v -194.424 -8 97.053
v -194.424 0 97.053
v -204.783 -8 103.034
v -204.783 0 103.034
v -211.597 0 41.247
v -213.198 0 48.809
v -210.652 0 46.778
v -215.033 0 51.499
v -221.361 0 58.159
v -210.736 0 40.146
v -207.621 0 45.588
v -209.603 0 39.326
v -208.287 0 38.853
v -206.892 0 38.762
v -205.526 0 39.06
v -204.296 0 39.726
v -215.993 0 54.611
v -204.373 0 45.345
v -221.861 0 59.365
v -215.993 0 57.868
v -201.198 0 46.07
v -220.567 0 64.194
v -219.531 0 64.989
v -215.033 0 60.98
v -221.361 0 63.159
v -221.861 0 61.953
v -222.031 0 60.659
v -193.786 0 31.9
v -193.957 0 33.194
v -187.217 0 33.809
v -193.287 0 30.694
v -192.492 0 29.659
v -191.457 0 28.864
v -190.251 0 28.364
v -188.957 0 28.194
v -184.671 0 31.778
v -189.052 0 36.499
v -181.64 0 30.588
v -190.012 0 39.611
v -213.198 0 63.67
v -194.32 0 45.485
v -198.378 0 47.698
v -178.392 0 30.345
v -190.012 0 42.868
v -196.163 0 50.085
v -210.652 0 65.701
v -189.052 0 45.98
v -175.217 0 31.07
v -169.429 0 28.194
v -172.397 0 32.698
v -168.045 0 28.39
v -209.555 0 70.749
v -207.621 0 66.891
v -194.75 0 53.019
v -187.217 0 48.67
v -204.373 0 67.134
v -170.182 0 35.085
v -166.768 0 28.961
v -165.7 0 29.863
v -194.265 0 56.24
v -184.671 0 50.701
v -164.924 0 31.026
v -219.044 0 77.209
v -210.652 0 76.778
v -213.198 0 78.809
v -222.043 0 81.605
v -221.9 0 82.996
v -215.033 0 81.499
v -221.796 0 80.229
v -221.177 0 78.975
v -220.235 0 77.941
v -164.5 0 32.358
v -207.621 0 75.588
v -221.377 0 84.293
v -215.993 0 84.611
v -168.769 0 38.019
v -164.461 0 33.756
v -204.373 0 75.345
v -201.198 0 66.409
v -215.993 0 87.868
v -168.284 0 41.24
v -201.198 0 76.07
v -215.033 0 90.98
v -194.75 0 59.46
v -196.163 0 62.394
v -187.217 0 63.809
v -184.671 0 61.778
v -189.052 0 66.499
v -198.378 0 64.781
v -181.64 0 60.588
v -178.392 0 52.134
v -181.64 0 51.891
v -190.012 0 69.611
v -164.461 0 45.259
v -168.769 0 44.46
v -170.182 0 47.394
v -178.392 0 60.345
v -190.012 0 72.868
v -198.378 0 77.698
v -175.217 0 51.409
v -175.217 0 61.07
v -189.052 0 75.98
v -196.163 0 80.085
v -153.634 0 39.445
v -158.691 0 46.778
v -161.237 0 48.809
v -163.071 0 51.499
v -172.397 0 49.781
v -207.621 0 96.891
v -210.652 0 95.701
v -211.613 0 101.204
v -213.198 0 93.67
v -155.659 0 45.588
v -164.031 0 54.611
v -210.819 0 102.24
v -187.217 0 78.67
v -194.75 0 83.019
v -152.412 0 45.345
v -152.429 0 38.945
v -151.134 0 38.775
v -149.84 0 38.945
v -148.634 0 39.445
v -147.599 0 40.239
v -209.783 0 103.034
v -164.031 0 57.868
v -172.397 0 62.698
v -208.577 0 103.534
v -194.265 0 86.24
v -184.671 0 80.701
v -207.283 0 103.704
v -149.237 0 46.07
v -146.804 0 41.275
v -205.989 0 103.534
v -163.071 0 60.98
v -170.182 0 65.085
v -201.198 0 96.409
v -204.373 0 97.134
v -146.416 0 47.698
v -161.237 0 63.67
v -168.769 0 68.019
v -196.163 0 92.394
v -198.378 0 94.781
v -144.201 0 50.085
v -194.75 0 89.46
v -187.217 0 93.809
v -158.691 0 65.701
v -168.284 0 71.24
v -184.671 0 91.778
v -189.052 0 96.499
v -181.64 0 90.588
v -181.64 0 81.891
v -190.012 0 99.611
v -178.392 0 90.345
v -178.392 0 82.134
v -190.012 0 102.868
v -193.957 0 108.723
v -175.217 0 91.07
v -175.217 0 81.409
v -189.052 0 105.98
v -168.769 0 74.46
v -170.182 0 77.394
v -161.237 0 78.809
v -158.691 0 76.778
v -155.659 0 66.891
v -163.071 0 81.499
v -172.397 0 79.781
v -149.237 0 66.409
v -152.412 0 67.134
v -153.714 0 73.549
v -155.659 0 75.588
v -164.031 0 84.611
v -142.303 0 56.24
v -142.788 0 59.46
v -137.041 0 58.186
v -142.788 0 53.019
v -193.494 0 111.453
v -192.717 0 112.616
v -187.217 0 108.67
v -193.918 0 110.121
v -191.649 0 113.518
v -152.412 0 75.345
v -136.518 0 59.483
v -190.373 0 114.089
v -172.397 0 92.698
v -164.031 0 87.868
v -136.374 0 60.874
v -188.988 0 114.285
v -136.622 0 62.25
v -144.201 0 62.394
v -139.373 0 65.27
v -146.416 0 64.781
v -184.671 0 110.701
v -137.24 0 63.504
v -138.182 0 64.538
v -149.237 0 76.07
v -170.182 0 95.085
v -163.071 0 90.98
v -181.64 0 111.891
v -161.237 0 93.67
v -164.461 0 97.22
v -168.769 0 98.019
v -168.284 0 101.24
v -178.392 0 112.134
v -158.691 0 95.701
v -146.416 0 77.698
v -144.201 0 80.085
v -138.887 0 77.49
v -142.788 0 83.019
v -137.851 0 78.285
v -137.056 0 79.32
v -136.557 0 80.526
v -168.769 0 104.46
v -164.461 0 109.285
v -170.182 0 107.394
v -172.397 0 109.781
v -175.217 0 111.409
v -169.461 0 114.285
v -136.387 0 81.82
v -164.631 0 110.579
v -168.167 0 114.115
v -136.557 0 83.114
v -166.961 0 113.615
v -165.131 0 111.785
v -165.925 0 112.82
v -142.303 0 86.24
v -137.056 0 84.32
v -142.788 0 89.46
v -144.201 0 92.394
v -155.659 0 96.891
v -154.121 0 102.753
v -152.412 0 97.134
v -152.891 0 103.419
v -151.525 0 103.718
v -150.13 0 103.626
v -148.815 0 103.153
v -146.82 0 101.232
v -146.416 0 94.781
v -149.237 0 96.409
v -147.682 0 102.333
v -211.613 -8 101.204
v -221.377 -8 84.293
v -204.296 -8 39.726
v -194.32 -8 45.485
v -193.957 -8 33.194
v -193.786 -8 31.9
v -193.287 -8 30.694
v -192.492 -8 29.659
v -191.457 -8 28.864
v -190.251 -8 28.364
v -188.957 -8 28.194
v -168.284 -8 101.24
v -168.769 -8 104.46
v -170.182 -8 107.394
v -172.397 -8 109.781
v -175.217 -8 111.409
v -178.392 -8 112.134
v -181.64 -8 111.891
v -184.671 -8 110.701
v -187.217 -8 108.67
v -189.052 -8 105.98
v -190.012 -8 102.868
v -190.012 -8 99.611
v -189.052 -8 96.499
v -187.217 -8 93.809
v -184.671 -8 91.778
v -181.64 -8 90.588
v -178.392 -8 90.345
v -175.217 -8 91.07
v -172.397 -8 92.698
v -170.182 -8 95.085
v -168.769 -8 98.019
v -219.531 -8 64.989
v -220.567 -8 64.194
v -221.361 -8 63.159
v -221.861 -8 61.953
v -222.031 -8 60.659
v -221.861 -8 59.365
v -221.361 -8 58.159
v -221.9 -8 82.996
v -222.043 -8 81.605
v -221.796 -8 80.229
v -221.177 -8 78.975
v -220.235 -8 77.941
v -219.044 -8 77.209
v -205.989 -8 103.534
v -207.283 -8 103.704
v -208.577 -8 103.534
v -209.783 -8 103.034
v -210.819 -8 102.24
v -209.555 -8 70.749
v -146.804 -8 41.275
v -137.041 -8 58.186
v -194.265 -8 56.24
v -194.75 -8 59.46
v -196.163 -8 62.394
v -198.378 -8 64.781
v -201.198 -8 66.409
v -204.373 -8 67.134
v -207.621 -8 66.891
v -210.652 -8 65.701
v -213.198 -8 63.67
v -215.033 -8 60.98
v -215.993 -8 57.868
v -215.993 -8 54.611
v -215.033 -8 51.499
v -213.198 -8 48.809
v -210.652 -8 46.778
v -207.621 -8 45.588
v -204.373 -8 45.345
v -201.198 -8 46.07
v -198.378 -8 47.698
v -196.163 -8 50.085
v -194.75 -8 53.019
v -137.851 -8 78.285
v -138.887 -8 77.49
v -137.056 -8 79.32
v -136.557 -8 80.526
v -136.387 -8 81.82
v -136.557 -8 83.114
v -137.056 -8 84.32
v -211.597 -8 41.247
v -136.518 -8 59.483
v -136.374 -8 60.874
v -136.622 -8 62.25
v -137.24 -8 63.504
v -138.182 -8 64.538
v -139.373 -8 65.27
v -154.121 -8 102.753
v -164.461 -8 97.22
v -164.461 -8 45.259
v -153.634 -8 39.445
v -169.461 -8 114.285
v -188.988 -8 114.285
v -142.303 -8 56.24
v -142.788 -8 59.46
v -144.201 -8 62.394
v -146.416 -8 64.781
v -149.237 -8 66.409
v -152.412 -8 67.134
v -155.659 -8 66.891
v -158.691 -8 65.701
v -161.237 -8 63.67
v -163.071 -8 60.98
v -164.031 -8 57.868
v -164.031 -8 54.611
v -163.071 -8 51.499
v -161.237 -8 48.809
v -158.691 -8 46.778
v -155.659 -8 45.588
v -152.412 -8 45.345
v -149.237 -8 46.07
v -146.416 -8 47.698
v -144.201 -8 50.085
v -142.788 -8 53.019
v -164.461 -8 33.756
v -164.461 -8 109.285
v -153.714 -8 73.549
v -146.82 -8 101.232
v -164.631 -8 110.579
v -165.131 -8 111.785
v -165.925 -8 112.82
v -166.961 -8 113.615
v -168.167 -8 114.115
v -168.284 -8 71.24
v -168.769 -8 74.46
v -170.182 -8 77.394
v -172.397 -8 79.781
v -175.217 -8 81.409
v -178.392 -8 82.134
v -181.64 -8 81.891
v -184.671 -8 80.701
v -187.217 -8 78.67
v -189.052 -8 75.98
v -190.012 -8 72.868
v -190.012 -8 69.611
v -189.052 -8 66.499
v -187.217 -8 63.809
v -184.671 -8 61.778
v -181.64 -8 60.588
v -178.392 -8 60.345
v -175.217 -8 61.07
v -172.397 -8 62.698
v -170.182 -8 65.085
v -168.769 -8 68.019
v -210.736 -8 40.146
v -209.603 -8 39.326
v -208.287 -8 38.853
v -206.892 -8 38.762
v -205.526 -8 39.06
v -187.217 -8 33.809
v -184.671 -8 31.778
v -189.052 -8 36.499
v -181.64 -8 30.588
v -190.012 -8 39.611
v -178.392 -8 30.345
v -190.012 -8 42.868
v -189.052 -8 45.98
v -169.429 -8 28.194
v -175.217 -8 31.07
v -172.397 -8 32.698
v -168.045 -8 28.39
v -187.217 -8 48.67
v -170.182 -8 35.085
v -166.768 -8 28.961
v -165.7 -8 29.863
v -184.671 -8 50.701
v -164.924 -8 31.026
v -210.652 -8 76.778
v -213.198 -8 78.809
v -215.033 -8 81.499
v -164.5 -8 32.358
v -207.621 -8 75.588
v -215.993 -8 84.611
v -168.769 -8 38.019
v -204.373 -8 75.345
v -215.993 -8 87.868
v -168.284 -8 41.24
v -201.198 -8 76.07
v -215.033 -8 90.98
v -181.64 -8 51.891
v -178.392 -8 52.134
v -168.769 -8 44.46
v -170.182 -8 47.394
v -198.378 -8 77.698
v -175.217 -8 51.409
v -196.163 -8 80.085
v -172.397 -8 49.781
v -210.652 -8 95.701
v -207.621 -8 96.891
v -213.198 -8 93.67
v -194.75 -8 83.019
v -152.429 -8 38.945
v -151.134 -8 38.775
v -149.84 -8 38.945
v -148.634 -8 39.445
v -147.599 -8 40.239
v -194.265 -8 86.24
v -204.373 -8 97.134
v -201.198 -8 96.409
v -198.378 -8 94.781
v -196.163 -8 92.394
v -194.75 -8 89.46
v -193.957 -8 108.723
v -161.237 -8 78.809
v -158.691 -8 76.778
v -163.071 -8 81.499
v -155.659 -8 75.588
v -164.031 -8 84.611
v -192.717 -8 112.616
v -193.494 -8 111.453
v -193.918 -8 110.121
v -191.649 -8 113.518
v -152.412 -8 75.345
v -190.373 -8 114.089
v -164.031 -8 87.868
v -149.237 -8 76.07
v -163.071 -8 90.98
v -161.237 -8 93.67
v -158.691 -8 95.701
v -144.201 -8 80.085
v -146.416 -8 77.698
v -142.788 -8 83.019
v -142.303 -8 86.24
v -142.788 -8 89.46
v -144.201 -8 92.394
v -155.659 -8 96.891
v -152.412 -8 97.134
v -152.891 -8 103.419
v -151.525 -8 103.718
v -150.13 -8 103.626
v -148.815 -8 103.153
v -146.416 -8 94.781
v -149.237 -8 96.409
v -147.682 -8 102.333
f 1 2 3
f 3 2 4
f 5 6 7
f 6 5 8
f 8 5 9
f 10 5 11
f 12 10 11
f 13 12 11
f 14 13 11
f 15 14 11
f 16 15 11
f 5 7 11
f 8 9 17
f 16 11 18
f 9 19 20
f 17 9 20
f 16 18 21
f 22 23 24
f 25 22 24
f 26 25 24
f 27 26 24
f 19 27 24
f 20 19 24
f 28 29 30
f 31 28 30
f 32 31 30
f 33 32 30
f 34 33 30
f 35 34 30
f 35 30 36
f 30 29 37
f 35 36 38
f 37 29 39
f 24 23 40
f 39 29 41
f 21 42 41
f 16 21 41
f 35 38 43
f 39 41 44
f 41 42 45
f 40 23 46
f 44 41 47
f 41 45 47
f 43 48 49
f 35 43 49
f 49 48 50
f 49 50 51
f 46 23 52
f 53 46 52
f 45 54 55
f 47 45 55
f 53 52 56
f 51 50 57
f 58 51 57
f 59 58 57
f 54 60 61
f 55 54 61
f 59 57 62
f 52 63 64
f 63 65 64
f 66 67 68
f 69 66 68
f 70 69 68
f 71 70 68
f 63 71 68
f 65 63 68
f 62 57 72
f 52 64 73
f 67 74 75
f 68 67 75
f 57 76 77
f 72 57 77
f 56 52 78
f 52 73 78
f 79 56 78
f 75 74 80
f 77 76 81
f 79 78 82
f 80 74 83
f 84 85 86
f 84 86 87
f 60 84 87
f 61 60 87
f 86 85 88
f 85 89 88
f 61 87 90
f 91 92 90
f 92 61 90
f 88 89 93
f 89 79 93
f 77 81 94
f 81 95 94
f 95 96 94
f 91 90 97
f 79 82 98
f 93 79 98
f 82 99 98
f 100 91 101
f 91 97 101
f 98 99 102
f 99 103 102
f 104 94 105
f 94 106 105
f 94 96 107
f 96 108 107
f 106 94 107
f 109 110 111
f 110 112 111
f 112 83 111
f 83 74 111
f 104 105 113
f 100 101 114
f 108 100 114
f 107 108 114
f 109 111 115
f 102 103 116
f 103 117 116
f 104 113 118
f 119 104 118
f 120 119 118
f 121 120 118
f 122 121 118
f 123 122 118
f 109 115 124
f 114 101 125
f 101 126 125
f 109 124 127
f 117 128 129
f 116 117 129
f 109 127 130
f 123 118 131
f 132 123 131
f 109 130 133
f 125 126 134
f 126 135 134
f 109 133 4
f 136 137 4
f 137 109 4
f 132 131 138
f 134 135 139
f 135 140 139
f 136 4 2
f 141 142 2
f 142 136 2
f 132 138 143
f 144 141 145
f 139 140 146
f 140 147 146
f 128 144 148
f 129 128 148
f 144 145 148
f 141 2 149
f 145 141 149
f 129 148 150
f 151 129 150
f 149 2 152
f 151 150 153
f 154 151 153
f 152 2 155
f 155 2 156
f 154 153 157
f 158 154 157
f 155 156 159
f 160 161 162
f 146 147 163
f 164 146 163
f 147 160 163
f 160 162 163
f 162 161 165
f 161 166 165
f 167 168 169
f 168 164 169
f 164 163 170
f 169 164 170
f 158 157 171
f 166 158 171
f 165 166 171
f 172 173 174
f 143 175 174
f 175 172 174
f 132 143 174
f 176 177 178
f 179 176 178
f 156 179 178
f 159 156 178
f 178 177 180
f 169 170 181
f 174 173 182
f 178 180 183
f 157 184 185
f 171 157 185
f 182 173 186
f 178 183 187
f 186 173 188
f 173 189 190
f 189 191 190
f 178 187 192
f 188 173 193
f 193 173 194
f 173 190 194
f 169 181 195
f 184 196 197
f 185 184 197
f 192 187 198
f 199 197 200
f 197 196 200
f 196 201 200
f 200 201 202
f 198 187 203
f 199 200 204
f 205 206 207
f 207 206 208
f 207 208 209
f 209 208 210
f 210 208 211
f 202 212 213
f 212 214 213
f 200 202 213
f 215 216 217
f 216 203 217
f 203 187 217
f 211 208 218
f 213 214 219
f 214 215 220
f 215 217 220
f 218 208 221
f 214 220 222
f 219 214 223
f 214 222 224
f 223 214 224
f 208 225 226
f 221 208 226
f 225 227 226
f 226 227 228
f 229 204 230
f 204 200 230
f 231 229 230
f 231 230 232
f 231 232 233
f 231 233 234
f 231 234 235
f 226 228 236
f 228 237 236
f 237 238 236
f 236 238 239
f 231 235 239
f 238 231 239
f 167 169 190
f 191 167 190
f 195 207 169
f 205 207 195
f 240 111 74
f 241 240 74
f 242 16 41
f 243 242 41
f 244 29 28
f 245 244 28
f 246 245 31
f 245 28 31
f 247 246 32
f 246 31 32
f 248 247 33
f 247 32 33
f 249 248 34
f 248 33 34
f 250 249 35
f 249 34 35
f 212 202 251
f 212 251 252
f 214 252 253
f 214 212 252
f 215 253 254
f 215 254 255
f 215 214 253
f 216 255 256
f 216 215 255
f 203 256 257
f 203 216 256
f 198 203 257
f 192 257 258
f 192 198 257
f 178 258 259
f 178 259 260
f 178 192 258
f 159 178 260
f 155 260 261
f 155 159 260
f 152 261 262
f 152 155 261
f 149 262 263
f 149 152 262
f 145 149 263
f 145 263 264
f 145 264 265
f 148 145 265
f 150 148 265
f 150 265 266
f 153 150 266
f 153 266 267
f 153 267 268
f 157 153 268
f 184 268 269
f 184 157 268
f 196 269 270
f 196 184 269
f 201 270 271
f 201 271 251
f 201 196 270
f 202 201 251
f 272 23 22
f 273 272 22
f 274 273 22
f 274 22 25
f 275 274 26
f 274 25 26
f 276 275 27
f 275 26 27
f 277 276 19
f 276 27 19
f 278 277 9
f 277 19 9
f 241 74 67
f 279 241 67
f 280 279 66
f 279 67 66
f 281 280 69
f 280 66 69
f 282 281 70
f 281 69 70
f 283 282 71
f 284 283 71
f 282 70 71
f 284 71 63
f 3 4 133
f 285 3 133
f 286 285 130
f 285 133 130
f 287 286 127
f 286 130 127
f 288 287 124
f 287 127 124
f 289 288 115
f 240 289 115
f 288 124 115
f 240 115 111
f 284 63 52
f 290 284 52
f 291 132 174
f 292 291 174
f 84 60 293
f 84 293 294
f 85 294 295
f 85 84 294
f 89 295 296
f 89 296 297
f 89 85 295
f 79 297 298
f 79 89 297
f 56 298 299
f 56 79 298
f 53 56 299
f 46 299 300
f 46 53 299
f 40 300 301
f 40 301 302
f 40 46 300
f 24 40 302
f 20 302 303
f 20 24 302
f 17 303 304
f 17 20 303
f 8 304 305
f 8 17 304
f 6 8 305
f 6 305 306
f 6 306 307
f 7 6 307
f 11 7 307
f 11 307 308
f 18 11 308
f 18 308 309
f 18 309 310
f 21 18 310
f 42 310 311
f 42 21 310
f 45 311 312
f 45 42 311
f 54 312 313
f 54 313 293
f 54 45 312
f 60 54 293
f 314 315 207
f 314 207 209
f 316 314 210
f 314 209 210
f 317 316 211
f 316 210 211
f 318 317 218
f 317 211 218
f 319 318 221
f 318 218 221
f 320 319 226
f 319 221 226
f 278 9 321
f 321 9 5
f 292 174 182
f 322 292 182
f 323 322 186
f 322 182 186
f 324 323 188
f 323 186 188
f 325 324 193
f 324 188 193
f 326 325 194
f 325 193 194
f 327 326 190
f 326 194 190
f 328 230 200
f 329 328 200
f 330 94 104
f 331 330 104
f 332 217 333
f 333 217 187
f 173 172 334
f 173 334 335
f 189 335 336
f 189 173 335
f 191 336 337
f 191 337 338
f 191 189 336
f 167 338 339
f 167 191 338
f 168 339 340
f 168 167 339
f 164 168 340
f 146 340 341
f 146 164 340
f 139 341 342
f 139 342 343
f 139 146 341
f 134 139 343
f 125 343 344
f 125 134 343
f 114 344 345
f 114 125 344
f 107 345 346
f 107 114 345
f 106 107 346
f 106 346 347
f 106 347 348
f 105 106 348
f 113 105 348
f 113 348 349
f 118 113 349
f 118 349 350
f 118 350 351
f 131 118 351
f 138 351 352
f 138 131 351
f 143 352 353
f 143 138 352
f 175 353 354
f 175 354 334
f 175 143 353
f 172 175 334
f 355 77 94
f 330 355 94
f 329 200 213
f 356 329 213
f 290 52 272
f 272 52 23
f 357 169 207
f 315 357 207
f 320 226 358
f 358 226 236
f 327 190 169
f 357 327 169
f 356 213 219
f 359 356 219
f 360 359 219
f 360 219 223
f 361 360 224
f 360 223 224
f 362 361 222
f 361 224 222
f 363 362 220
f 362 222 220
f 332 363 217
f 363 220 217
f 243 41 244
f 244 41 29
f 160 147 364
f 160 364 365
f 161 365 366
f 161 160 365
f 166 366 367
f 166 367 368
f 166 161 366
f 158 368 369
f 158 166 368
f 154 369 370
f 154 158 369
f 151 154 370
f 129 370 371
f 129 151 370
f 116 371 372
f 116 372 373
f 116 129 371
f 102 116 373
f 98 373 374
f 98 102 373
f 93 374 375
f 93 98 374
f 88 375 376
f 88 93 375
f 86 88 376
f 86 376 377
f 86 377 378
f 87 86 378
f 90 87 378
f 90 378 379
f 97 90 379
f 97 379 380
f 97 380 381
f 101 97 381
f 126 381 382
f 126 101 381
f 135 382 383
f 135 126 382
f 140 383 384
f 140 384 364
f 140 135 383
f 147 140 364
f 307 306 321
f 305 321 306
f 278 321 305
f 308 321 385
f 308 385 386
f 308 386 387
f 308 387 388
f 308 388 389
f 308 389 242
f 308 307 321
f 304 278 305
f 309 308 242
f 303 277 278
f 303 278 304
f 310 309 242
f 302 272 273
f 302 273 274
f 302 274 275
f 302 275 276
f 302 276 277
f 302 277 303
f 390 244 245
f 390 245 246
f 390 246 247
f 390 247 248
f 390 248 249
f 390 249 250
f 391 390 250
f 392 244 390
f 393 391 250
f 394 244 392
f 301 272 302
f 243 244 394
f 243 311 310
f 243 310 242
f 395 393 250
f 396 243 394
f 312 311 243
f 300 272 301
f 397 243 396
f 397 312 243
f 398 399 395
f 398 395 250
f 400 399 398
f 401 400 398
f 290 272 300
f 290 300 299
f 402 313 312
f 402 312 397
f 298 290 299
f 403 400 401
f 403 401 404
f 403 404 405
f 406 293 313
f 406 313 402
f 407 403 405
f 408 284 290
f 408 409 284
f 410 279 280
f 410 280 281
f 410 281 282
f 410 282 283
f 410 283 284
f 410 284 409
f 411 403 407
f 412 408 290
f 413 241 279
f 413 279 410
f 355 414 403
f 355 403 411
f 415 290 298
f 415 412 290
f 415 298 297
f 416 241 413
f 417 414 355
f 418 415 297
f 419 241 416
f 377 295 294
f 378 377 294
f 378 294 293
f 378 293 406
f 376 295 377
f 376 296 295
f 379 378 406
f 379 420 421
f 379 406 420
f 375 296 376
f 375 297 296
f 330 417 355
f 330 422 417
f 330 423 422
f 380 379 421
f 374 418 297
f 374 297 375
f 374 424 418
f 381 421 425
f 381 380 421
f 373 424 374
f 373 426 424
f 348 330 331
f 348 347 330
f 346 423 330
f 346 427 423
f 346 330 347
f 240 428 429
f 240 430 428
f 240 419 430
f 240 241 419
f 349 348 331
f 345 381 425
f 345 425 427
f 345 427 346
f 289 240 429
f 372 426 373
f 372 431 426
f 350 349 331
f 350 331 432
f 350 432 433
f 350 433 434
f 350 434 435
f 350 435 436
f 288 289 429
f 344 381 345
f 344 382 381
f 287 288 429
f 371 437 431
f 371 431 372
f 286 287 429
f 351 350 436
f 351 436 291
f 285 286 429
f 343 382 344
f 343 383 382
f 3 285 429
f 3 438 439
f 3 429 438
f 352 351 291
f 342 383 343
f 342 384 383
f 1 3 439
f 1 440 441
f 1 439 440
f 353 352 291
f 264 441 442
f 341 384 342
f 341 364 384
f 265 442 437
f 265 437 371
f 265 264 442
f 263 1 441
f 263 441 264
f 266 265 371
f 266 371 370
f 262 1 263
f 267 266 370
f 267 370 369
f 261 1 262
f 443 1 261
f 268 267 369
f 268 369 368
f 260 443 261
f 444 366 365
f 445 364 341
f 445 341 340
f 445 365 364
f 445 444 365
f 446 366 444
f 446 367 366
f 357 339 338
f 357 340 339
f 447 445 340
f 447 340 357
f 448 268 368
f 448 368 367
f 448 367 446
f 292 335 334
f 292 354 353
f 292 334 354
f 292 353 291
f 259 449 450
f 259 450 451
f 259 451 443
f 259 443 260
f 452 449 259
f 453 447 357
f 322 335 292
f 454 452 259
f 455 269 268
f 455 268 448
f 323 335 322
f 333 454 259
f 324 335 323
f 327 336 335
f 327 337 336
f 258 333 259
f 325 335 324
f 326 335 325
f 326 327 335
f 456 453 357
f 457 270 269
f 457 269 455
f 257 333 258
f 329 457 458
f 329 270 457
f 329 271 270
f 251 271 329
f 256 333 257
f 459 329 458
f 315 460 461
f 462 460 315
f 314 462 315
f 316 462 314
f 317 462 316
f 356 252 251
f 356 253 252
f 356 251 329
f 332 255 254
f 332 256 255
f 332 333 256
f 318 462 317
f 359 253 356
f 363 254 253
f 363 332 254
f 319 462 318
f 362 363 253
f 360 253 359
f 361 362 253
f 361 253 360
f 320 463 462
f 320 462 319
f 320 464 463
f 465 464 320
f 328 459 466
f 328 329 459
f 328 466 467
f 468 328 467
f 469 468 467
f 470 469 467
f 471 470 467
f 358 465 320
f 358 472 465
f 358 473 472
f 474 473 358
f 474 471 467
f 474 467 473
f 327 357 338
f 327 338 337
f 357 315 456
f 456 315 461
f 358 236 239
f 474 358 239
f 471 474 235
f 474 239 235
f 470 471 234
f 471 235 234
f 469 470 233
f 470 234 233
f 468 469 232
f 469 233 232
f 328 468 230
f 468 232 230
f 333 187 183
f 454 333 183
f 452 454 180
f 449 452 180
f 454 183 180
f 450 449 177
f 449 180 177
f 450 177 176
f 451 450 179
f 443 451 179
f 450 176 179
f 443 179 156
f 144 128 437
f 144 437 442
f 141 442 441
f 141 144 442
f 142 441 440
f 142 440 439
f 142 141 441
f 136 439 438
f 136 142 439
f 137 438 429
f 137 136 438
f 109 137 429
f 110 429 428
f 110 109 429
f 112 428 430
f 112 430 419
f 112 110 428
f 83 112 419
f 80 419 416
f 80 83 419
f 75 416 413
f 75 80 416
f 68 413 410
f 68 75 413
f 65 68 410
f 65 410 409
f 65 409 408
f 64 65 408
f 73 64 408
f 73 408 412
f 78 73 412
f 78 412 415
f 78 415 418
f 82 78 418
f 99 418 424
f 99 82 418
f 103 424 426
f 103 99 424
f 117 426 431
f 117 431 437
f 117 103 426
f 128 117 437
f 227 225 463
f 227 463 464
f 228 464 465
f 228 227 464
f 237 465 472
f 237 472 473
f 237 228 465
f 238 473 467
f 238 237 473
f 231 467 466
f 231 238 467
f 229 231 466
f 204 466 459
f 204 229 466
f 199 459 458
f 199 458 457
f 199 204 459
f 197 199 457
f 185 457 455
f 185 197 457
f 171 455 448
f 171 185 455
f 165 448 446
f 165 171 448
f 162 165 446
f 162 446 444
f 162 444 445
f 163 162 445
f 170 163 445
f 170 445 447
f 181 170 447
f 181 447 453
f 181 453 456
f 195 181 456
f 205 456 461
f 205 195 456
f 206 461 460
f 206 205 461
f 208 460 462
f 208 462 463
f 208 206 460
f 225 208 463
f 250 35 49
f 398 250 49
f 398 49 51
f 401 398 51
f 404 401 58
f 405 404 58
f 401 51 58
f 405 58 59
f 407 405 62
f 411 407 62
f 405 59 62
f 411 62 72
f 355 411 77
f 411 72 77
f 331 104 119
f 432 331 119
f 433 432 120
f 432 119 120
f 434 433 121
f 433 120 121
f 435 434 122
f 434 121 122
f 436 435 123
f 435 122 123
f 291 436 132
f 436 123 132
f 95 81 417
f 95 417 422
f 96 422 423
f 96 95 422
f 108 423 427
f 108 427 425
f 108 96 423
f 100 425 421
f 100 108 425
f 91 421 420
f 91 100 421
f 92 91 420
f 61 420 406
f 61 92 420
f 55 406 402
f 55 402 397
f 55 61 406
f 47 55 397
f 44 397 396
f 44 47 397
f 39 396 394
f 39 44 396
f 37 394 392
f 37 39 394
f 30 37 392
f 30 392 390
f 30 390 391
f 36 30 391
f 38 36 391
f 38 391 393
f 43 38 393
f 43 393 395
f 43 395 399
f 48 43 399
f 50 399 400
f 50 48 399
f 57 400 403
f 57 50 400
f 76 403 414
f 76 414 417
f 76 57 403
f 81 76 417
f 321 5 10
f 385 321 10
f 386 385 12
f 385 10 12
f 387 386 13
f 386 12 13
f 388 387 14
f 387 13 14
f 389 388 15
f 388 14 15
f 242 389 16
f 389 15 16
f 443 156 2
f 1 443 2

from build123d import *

# Parameters (mm, degrees)
F0_R     = 10.925
F1_DEPTH = 8


# Not quite as in the source:
# - a feature names something its author has since deleted; it is built from what else it names


with BuildPart() as f1:
    # F0 (on Front) → F1 (new body)
    with BuildSketch(Plane.XZ):
        with BuildLine():
            ThreePointArc((-164.4608943756, 109.2849649489), (-165.9253604697, 112.8204988548), (-169.4608943756, 114.2849649489))
            Line((-169.4608943756, 114.2849649489), (-188.9884267566, 114.2849649489))
            ThreePointArc((-188.9884267566, 114.2849649489), (-192.7173858315, 112.6158603567), (-193.95673582, 108.7229106361))
            Line((-193.95673582, 108.7229106361), (-194.4236024673, 97.0532244981))
            Line((-194.4236024673, 97.0532244981), (-204.7831671065, 103.0343219313))
            ThreePointArc((-204.7831671065, 103.0343219313), (-208.577262332, 103.5338240438), (-211.6132941254, 101.2041949124))
            Line((-211.6132941254, 101.2041949123), (-221.3770596376, 84.2928569721))
            ThreePointArc((-221.3770596376, 84.2928569721), (-221.7960530872, 80.2289308569), (-219.0443345156, 77.209146778))
            Line((-219.0443345156, 77.209146778), (-209.5551351868, 70.7485068424))
            Line((-209.5551351868, 70.7485068424), (-219.5310878287, 64.9888878992))
            ThreePointArc((-219.5310878287, 64.9888878992), (-221.8607169602, 61.9528561057), (-221.3612148477, 58.1587608802))
            Line((-221.3612148477, 58.1587608802), (-211.5974493355, 41.24742294))
            ThreePointArc((-211.5974493355, 41.24742294), (-208.2874828054, 38.852600911), (-204.2964137934, 39.7257670587))
            Line((-204.2964137934, 39.7257670587), (-194.3204611514, 45.4853860019))
            Line((-194.3204611514, 45.4853860019), (-193.95673582, 33.1940968847))
            ThreePointArc((-193.95673582, 33.1940968847), (-192.492269726, 29.6585629787), (-188.95673582, 28.1940968847))
            Line((-188.95673582, 28.1940968847), (-169.4292047957, 28.1940968847))
            ThreePointArc((-169.4292047957, 28.1940968847), (-165.7002448161, 29.8632009709), (-164.4608943756, 33.7561511974))
            Line((-164.4608943756, 33.7561511974), (-164.4608943756, 45.2587688032))
            Line((-164.4608943756, 45.2587688032), (-153.6344630891, 39.4447399023))
            ThreePointArc((-153.6344630891, 39.4447399023), (-149.8403678636, 38.9452377897), (-146.8043360702, 41.2748669212))
            Line((-146.8043360702, 41.2748669212), (-137.040570558, 58.1862048614))
            ThreePointArc((-137.040570558, 58.1862048614), (-136.6215771084, 62.2501309766), (-139.37329568, 65.2699150555))
            Line((-139.37329568, 65.2699150555), (-153.7136262629, 73.5493087778))
            Line((-153.7136262629, 73.5493087778), (-138.8865423669, 77.4901739344))
            ThreePointArc((-138.8865423669, 77.4901739344), (-136.5569132354, 80.5262057278), (-137.056415348, 84.3203009533))
            Line((-137.056415348, 84.3203009533), (-146.8201808601, 101.2316388936))
            ThreePointArc((-146.8201808601, 101.2316388936), (-150.1301473902, 103.6264609225), (-154.1212164023, 102.7532947749))
            Line((-154.1212164023, 102.7532947749), (-164.4608943756, 97.2202930303))
            Line((-164.4608943756, 97.2202930303), (-164.4608943756, 109.2849649489))
        make_face()
        with Locations((-179.2088150978, 41.2395309168)):
            Circle(F0_R, mode=Mode.SUBTRACT)
        with Locations((-205.1895772113, 56.2395309168)):
            Circle(F0_R, mode=Mode.SUBTRACT)
        with Locations((-153.2280529843, 56.2395309168)):
            Circle(F0_R, mode=Mode.SUBTRACT)
        with Locations((-205.1895772113, 86.2395309168)):
            Circle(F0_R, mode=Mode.SUBTRACT)
        with Locations((-179.2088150978, 71.2395309168)):
            Circle(F0_R, mode=Mode.SUBTRACT)
        with Locations((-179.2088150978, 101.2395309168)):
            Circle(F0_R, mode=Mode.SUBTRACT)
        with Locations((-153.2280529843, 86.2395309168)):
            Circle(F0_R, mode=Mode.SUBTRACT)
    extrude(amount=F1_DEPTH)


solid = f1.part
